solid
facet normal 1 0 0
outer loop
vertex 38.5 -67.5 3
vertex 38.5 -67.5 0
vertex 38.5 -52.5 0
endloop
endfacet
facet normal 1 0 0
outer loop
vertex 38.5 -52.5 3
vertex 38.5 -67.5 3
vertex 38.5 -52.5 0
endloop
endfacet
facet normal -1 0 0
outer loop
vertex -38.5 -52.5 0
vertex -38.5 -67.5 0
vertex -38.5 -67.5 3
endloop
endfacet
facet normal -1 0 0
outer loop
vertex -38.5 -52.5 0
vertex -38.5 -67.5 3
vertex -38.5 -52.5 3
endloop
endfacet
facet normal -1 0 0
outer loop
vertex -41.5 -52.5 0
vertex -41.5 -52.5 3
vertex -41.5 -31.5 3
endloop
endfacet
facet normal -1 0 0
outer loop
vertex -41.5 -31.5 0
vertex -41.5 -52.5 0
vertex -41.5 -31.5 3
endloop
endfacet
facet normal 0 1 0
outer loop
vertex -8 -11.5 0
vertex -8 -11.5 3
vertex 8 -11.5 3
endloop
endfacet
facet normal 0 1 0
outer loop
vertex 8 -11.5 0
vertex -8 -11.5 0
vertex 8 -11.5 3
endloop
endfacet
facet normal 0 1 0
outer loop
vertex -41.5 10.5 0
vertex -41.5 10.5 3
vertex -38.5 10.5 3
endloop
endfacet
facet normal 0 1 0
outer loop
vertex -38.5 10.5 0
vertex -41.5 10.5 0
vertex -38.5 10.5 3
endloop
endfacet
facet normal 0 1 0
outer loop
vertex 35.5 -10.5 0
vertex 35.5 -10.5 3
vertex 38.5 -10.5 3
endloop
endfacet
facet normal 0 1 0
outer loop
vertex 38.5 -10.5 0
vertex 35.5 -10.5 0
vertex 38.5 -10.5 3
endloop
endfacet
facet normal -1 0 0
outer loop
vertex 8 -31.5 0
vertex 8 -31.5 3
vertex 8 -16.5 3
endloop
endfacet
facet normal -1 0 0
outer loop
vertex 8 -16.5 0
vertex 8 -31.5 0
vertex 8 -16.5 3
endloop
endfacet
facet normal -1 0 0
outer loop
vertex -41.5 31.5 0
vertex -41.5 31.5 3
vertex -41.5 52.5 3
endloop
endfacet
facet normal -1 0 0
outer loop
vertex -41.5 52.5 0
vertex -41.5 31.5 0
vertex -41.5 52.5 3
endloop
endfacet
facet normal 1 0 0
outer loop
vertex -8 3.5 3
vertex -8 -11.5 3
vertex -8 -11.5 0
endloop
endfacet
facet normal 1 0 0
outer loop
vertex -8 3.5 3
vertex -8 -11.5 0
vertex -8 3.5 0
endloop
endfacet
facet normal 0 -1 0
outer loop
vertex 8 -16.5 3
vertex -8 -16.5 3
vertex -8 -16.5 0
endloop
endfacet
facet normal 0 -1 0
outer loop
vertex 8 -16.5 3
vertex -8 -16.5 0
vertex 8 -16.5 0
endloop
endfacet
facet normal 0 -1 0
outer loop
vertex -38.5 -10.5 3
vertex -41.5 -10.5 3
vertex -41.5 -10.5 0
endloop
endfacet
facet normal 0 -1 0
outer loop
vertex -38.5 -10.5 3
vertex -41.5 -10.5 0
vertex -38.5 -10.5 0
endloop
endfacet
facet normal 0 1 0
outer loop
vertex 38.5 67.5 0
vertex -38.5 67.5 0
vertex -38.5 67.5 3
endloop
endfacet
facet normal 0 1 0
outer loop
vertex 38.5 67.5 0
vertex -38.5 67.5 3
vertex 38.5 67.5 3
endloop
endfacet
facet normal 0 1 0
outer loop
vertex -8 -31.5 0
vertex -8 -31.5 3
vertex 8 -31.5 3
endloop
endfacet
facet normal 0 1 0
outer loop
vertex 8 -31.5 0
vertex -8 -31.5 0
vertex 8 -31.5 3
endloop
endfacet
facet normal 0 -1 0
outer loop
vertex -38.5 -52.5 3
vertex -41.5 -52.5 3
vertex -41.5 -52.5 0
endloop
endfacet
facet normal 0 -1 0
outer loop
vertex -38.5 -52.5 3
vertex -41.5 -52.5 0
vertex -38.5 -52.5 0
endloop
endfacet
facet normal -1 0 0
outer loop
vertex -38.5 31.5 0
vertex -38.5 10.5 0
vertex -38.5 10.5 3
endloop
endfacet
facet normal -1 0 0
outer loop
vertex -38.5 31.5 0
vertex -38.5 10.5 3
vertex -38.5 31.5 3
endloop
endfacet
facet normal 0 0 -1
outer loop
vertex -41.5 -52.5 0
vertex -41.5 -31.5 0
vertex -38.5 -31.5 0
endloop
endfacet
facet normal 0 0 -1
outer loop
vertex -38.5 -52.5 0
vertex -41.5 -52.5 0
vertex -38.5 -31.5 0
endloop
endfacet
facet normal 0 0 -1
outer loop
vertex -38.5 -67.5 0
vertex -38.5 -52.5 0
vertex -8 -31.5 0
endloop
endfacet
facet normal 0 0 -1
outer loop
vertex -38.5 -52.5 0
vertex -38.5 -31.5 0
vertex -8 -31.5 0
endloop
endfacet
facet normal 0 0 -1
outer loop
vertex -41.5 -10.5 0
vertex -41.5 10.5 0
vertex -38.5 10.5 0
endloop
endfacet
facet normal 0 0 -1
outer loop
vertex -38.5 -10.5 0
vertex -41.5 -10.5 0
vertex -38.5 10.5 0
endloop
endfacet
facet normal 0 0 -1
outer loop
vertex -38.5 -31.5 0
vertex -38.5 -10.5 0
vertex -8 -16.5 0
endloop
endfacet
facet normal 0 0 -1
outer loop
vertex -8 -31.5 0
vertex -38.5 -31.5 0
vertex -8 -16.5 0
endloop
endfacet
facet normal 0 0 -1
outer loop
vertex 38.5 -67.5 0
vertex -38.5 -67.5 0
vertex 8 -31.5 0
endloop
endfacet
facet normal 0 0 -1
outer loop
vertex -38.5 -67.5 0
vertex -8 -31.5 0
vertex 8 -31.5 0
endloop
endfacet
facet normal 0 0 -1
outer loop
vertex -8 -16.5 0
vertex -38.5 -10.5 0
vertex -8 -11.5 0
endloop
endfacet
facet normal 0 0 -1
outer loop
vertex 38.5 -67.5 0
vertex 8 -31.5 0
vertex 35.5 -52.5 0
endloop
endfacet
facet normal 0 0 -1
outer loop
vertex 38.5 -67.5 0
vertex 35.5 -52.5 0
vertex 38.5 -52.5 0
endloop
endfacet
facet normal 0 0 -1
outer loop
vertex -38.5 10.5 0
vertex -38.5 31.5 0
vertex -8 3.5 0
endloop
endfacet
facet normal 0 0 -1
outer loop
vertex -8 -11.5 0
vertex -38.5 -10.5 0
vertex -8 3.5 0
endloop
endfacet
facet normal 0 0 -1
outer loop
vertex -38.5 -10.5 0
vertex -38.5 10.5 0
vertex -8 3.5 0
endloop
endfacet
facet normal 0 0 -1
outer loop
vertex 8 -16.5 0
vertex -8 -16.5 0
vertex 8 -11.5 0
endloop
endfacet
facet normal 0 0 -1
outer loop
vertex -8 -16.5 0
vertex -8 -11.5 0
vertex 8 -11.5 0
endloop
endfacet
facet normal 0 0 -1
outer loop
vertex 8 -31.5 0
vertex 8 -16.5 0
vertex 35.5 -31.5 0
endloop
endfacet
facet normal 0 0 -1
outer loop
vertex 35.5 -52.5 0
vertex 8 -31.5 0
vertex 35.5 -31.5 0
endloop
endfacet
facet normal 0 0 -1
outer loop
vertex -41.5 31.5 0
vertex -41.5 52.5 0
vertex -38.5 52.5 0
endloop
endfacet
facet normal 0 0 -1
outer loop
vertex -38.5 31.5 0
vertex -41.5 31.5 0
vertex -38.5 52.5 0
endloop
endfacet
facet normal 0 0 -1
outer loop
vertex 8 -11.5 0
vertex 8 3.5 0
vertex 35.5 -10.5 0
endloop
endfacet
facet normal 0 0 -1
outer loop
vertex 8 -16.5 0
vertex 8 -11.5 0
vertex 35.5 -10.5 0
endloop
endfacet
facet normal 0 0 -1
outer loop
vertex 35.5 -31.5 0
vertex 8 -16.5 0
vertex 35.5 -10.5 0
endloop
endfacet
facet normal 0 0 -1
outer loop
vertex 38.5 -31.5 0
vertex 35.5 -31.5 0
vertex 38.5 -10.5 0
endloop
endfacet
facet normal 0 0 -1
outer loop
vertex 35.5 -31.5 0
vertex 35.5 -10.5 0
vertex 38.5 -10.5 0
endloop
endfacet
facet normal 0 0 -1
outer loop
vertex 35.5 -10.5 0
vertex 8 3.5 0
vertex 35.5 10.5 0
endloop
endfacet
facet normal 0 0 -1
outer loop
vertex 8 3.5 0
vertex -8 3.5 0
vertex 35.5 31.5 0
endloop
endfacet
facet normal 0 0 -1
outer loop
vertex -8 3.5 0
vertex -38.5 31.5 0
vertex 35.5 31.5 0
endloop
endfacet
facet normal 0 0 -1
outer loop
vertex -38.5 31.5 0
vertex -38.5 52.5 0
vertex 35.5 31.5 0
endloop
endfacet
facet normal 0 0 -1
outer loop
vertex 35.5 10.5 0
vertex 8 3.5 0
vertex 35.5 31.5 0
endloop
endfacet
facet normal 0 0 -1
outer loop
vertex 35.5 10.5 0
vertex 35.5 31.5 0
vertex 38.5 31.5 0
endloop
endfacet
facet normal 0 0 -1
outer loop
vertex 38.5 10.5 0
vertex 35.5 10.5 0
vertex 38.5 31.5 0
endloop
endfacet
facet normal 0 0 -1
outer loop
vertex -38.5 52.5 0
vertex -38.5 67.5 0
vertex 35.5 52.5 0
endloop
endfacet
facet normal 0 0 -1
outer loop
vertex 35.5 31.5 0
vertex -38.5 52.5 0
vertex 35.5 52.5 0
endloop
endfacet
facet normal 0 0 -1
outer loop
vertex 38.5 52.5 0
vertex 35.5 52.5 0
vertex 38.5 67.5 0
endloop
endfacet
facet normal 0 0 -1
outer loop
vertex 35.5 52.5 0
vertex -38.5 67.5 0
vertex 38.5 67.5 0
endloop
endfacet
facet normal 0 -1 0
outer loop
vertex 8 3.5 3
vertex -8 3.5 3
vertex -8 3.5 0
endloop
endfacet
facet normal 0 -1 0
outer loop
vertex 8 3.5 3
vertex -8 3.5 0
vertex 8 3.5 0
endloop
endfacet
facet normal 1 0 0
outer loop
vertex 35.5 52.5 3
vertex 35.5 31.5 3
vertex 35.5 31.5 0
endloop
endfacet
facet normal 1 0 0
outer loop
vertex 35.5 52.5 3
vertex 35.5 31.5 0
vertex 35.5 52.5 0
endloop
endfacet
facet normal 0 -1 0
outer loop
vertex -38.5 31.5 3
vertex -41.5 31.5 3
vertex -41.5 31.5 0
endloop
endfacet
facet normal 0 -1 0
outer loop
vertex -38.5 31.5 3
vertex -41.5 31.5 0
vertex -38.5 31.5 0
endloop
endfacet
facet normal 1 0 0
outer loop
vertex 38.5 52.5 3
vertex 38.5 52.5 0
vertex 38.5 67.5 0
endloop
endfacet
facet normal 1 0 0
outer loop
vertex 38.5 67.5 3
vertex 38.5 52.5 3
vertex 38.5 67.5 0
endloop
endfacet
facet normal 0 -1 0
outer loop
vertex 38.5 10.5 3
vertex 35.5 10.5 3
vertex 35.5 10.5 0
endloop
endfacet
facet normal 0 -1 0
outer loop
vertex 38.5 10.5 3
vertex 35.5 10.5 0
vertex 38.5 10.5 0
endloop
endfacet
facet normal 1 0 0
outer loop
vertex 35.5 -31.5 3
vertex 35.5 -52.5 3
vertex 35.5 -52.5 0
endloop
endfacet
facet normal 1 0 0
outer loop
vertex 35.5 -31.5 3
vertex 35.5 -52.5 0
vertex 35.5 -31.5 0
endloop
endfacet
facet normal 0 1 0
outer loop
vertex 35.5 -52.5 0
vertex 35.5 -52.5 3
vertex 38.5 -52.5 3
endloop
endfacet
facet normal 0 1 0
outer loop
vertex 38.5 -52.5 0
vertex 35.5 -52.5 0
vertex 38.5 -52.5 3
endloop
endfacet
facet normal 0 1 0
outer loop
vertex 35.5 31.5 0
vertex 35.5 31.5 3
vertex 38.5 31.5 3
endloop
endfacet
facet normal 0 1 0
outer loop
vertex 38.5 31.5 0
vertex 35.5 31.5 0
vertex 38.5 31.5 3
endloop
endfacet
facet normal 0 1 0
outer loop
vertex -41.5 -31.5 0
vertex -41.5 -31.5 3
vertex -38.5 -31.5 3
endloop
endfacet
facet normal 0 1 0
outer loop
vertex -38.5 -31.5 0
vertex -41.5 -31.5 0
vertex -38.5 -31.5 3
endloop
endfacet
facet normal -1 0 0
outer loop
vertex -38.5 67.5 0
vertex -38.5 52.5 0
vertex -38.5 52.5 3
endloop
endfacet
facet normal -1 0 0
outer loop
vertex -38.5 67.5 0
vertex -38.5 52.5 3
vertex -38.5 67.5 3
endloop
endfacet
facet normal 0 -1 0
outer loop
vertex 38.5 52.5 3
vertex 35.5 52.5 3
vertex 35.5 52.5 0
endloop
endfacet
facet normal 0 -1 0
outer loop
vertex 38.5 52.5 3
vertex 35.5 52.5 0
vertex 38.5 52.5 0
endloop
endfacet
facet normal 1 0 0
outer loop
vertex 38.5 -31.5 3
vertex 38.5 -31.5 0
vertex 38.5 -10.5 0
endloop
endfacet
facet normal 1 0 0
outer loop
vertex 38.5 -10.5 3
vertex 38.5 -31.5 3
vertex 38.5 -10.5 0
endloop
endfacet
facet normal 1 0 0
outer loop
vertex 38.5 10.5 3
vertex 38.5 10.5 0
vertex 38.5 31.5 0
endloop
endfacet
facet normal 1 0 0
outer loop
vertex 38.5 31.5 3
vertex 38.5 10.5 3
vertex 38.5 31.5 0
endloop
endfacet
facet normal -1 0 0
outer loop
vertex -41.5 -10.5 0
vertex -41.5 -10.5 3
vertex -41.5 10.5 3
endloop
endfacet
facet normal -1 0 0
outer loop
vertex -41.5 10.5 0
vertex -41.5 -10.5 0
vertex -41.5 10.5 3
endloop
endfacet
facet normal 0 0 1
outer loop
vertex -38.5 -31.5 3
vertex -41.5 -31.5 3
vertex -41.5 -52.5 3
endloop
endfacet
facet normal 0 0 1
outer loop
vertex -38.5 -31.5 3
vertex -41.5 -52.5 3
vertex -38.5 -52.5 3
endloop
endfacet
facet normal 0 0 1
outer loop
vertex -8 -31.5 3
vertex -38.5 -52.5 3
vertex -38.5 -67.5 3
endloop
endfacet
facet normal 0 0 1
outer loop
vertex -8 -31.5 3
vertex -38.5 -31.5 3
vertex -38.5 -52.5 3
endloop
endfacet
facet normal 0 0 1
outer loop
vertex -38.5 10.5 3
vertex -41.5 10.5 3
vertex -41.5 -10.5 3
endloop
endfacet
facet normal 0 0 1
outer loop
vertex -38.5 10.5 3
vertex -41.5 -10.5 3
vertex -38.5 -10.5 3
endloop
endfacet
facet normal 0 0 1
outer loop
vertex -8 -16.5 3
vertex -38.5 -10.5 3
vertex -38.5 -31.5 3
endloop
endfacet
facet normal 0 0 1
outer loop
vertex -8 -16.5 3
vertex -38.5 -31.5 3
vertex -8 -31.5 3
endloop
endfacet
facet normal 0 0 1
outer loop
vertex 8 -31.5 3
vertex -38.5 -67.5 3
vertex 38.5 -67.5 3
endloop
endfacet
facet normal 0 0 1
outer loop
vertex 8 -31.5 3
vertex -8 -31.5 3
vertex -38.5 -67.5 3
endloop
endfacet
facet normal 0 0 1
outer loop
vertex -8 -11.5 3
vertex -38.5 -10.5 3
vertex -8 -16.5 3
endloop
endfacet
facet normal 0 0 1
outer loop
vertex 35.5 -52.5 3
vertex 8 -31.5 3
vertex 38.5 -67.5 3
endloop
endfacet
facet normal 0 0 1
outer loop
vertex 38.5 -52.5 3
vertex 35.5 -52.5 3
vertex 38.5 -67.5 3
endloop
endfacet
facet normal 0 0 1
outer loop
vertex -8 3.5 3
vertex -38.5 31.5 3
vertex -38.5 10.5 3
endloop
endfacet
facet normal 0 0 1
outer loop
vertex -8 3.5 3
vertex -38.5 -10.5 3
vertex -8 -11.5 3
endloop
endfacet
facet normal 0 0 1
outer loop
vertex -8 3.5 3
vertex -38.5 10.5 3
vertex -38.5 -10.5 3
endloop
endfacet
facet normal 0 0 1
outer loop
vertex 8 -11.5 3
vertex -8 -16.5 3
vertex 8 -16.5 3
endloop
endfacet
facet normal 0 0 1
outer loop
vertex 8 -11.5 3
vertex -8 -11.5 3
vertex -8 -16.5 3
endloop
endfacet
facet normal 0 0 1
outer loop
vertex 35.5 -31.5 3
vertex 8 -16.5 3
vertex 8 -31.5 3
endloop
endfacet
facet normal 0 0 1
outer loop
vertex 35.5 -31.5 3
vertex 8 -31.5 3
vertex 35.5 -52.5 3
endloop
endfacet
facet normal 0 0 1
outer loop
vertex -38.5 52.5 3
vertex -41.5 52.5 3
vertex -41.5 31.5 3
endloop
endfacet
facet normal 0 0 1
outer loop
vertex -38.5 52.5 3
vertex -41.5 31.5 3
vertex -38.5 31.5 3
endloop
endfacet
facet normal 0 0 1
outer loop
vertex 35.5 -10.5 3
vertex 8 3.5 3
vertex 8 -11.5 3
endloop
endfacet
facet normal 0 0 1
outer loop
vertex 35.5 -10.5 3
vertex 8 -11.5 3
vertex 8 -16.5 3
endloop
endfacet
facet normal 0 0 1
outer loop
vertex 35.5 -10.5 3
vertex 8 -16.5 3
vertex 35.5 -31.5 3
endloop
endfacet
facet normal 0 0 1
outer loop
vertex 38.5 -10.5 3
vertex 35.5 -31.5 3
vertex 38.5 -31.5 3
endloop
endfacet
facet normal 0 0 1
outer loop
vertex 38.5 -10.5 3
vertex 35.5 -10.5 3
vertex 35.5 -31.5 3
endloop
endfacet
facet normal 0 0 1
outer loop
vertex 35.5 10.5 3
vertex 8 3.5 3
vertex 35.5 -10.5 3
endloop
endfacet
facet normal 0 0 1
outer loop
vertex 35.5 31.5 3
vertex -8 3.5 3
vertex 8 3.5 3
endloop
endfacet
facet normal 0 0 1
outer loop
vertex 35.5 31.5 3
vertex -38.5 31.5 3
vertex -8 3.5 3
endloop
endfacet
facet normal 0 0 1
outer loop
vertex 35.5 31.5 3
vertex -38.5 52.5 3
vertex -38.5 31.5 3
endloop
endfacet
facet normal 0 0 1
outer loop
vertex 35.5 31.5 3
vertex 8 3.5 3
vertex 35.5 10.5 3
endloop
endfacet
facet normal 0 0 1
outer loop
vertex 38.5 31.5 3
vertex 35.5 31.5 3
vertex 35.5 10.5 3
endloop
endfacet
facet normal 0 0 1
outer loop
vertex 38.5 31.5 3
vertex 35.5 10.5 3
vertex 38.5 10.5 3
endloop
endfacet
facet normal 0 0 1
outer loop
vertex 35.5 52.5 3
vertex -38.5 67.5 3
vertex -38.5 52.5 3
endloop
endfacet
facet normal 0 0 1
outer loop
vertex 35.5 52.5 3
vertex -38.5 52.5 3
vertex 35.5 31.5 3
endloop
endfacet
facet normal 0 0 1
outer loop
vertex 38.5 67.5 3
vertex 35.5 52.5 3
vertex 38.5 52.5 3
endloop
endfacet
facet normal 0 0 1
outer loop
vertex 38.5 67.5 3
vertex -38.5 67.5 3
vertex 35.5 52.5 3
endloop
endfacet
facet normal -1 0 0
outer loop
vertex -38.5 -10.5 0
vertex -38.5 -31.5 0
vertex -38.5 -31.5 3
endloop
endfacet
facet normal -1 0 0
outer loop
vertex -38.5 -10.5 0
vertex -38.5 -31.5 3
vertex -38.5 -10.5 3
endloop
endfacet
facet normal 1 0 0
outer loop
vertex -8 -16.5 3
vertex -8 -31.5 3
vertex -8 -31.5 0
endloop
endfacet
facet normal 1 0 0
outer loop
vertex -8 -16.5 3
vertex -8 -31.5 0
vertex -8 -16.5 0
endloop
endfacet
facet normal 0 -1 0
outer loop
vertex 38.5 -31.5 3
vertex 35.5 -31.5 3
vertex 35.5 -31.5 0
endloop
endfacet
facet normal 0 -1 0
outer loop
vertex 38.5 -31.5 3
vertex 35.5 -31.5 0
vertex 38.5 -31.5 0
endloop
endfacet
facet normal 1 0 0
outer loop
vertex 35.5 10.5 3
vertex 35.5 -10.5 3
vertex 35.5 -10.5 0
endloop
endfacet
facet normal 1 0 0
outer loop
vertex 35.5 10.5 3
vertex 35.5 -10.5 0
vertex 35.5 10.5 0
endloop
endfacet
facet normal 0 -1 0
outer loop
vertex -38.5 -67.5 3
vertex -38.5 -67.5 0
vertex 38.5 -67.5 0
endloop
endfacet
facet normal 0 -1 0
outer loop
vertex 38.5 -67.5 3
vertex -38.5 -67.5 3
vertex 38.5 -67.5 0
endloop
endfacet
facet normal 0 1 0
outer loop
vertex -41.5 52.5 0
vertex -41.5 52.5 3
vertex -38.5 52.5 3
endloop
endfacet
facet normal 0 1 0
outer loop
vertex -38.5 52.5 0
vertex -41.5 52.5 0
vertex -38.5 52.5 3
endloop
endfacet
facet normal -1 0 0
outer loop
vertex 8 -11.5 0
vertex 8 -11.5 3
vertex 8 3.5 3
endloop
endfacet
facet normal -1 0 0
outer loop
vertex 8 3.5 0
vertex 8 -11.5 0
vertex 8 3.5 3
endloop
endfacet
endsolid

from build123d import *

# Parameters (mm, degrees)
ESBO_O1_W                = 77
ESBO_O1_H                = 135
RESSALTO_EXTRUS_O1_DEPTH = 3
ESBO_O4_W                = 3
ESBO_O4_H                = 21
CORTE_EXTRUS_O1_DEPTH    = 78.765673661
ESBO_O5_W                = 3
ESBO_O5_H                = 21
RESSALTO_EXTRUS_O2_DEPTH = 3
PADR_O_LINEAR1_COUNT     = 3
PADR_O_LINEAR1_PITCH     = 42
ESBO_O6_W                = 16
ESBO_O6_H                = 15
CORTE_EXTRUS_O2_DEPTH    = 80.293757636
PADR_O_LINEAR2_COUNT     = 2
PADR_O_LINEAR2_PITCH     = 20


with BuildPart() as part:
    # Esboço1 → Ressalto-extrusão1 (new body)
    with BuildSketch(Plane.XY):
        Rectangle(ESBO_O1_W, ESBO_O1_H)
    extrude(amount=RESSALTO_EXTRUS_O1_DEPTH)

    # Esboço4 → Corte-extrusão1 (cut, through all)
    with BuildSketch(Plane.XY.offset(3)):
        with Locations((37, 42)):
            Rectangle(ESBO_O4_W, ESBO_O4_H)
        with Locations((37, 0)):
            Rectangle(ESBO_O4_W, ESBO_O4_H)
        with Locations((37, -42)):
            Rectangle(ESBO_O4_W, ESBO_O4_H)
    extrude(amount=-CORTE_EXTRUS_O1_DEPTH, mode=Mode.SUBTRACT)

    # Esboço5 → Ressalto-extrusão2 (add)
    with BuildSketch(Plane.XY.offset(3)):
        with Locations((-40, 42)):
            Rectangle(ESBO_O5_W, ESBO_O5_H)
    ressalto_extrus_o2 = extrude(amount=-RESSALTO_EXTRUS_O2_DEPTH)

    # Padrão linear1: Ressalto-extrusão2 ×3
    with Locations(*[(0, -i * PADR_O_LINEAR1_PITCH, 0) for i in range(1, PADR_O_LINEAR1_COUNT)]):
        add(ressalto_extrus_o2)

    # Esboço6 → Corte-extrusão2 (cut, through all)
    with BuildSketch(Plane.XY.offset(3)):
        with Locations((0, -24)):
            Rectangle(ESBO_O6_W, ESBO_O6_H)
    corte_extrus_o2 = extrude(amount=-CORTE_EXTRUS_O2_DEPTH, mode=Mode.SUBTRACT)

    # Padrão linear2: Corte-extrusão2 ×2
    with Locations(*[(0, i * PADR_O_LINEAR2_PITCH, 0) for i in range(1, PADR_O_LINEAR2_COUNT)]):
        add(corte_extrus_o2, mode=Mode.SUBTRACT)


solid = part.part
